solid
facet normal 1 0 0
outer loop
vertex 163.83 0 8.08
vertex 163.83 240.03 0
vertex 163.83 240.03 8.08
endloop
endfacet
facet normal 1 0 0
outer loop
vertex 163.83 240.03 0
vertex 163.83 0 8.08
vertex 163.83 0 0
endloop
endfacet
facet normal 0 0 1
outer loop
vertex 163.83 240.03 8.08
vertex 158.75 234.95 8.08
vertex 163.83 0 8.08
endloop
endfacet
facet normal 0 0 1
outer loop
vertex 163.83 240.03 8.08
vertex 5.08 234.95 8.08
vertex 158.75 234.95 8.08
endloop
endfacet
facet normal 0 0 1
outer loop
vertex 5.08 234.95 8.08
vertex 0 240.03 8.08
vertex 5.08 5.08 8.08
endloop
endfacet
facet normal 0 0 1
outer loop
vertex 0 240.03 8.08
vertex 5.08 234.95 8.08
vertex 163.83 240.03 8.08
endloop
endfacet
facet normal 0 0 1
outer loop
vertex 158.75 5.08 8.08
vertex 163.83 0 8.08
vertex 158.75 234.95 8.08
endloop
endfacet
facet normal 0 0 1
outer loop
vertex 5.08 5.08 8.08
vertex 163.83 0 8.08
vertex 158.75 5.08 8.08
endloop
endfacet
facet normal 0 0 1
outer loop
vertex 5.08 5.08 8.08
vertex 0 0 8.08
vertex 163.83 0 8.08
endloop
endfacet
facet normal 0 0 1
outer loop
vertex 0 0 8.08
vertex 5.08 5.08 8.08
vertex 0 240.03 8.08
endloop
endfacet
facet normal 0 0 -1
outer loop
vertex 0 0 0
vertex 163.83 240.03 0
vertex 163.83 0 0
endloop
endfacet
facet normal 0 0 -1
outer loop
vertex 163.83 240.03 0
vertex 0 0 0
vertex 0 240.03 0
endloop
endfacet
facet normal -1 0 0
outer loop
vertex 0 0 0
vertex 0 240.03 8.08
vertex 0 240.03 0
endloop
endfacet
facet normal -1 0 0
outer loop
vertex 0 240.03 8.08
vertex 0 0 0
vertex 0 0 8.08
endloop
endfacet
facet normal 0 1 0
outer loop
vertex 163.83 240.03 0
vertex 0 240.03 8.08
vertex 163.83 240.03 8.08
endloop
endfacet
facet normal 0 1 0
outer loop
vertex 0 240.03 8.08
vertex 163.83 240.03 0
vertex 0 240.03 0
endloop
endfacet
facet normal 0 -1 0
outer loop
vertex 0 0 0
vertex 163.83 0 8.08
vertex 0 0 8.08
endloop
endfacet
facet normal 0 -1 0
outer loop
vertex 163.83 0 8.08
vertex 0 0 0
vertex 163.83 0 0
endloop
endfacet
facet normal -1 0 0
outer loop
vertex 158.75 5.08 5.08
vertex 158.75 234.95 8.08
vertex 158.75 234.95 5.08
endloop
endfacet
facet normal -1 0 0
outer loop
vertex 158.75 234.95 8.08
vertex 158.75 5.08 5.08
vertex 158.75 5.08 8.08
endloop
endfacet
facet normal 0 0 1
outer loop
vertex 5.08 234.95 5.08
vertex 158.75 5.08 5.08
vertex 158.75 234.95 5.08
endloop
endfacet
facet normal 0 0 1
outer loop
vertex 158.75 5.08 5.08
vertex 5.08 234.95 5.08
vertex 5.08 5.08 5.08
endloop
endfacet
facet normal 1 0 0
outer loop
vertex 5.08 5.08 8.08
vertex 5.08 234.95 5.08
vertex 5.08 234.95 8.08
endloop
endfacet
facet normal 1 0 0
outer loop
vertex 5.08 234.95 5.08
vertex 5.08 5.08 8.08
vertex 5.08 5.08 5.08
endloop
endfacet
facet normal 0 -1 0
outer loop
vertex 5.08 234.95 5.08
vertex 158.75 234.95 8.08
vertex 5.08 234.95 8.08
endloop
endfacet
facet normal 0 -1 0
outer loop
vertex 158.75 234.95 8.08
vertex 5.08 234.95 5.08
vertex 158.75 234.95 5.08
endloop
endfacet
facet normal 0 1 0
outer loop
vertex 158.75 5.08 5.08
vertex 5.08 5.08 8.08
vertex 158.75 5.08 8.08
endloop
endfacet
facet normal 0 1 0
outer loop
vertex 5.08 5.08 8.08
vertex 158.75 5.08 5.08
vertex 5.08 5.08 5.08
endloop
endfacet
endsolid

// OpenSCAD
inch = 25.4;

picture_x = 6.05 * inch;
picture_y = 9.05 * inch;
picture_z = 3;

wall_thickness = .2 * inch;

frame_x = picture_x + (wall_thickness * 2);
frame_y = picture_y + (wall_thickness * 2);
frame_z = picture_z + wall_thickness;

difference() {
    cube([frame_x, frame_y, frame_z]);
    translate([wall_thickness, wall_thickness, wall_thickness]) {
        cube([picture_x, picture_y, picture_z]);
    }
}     
